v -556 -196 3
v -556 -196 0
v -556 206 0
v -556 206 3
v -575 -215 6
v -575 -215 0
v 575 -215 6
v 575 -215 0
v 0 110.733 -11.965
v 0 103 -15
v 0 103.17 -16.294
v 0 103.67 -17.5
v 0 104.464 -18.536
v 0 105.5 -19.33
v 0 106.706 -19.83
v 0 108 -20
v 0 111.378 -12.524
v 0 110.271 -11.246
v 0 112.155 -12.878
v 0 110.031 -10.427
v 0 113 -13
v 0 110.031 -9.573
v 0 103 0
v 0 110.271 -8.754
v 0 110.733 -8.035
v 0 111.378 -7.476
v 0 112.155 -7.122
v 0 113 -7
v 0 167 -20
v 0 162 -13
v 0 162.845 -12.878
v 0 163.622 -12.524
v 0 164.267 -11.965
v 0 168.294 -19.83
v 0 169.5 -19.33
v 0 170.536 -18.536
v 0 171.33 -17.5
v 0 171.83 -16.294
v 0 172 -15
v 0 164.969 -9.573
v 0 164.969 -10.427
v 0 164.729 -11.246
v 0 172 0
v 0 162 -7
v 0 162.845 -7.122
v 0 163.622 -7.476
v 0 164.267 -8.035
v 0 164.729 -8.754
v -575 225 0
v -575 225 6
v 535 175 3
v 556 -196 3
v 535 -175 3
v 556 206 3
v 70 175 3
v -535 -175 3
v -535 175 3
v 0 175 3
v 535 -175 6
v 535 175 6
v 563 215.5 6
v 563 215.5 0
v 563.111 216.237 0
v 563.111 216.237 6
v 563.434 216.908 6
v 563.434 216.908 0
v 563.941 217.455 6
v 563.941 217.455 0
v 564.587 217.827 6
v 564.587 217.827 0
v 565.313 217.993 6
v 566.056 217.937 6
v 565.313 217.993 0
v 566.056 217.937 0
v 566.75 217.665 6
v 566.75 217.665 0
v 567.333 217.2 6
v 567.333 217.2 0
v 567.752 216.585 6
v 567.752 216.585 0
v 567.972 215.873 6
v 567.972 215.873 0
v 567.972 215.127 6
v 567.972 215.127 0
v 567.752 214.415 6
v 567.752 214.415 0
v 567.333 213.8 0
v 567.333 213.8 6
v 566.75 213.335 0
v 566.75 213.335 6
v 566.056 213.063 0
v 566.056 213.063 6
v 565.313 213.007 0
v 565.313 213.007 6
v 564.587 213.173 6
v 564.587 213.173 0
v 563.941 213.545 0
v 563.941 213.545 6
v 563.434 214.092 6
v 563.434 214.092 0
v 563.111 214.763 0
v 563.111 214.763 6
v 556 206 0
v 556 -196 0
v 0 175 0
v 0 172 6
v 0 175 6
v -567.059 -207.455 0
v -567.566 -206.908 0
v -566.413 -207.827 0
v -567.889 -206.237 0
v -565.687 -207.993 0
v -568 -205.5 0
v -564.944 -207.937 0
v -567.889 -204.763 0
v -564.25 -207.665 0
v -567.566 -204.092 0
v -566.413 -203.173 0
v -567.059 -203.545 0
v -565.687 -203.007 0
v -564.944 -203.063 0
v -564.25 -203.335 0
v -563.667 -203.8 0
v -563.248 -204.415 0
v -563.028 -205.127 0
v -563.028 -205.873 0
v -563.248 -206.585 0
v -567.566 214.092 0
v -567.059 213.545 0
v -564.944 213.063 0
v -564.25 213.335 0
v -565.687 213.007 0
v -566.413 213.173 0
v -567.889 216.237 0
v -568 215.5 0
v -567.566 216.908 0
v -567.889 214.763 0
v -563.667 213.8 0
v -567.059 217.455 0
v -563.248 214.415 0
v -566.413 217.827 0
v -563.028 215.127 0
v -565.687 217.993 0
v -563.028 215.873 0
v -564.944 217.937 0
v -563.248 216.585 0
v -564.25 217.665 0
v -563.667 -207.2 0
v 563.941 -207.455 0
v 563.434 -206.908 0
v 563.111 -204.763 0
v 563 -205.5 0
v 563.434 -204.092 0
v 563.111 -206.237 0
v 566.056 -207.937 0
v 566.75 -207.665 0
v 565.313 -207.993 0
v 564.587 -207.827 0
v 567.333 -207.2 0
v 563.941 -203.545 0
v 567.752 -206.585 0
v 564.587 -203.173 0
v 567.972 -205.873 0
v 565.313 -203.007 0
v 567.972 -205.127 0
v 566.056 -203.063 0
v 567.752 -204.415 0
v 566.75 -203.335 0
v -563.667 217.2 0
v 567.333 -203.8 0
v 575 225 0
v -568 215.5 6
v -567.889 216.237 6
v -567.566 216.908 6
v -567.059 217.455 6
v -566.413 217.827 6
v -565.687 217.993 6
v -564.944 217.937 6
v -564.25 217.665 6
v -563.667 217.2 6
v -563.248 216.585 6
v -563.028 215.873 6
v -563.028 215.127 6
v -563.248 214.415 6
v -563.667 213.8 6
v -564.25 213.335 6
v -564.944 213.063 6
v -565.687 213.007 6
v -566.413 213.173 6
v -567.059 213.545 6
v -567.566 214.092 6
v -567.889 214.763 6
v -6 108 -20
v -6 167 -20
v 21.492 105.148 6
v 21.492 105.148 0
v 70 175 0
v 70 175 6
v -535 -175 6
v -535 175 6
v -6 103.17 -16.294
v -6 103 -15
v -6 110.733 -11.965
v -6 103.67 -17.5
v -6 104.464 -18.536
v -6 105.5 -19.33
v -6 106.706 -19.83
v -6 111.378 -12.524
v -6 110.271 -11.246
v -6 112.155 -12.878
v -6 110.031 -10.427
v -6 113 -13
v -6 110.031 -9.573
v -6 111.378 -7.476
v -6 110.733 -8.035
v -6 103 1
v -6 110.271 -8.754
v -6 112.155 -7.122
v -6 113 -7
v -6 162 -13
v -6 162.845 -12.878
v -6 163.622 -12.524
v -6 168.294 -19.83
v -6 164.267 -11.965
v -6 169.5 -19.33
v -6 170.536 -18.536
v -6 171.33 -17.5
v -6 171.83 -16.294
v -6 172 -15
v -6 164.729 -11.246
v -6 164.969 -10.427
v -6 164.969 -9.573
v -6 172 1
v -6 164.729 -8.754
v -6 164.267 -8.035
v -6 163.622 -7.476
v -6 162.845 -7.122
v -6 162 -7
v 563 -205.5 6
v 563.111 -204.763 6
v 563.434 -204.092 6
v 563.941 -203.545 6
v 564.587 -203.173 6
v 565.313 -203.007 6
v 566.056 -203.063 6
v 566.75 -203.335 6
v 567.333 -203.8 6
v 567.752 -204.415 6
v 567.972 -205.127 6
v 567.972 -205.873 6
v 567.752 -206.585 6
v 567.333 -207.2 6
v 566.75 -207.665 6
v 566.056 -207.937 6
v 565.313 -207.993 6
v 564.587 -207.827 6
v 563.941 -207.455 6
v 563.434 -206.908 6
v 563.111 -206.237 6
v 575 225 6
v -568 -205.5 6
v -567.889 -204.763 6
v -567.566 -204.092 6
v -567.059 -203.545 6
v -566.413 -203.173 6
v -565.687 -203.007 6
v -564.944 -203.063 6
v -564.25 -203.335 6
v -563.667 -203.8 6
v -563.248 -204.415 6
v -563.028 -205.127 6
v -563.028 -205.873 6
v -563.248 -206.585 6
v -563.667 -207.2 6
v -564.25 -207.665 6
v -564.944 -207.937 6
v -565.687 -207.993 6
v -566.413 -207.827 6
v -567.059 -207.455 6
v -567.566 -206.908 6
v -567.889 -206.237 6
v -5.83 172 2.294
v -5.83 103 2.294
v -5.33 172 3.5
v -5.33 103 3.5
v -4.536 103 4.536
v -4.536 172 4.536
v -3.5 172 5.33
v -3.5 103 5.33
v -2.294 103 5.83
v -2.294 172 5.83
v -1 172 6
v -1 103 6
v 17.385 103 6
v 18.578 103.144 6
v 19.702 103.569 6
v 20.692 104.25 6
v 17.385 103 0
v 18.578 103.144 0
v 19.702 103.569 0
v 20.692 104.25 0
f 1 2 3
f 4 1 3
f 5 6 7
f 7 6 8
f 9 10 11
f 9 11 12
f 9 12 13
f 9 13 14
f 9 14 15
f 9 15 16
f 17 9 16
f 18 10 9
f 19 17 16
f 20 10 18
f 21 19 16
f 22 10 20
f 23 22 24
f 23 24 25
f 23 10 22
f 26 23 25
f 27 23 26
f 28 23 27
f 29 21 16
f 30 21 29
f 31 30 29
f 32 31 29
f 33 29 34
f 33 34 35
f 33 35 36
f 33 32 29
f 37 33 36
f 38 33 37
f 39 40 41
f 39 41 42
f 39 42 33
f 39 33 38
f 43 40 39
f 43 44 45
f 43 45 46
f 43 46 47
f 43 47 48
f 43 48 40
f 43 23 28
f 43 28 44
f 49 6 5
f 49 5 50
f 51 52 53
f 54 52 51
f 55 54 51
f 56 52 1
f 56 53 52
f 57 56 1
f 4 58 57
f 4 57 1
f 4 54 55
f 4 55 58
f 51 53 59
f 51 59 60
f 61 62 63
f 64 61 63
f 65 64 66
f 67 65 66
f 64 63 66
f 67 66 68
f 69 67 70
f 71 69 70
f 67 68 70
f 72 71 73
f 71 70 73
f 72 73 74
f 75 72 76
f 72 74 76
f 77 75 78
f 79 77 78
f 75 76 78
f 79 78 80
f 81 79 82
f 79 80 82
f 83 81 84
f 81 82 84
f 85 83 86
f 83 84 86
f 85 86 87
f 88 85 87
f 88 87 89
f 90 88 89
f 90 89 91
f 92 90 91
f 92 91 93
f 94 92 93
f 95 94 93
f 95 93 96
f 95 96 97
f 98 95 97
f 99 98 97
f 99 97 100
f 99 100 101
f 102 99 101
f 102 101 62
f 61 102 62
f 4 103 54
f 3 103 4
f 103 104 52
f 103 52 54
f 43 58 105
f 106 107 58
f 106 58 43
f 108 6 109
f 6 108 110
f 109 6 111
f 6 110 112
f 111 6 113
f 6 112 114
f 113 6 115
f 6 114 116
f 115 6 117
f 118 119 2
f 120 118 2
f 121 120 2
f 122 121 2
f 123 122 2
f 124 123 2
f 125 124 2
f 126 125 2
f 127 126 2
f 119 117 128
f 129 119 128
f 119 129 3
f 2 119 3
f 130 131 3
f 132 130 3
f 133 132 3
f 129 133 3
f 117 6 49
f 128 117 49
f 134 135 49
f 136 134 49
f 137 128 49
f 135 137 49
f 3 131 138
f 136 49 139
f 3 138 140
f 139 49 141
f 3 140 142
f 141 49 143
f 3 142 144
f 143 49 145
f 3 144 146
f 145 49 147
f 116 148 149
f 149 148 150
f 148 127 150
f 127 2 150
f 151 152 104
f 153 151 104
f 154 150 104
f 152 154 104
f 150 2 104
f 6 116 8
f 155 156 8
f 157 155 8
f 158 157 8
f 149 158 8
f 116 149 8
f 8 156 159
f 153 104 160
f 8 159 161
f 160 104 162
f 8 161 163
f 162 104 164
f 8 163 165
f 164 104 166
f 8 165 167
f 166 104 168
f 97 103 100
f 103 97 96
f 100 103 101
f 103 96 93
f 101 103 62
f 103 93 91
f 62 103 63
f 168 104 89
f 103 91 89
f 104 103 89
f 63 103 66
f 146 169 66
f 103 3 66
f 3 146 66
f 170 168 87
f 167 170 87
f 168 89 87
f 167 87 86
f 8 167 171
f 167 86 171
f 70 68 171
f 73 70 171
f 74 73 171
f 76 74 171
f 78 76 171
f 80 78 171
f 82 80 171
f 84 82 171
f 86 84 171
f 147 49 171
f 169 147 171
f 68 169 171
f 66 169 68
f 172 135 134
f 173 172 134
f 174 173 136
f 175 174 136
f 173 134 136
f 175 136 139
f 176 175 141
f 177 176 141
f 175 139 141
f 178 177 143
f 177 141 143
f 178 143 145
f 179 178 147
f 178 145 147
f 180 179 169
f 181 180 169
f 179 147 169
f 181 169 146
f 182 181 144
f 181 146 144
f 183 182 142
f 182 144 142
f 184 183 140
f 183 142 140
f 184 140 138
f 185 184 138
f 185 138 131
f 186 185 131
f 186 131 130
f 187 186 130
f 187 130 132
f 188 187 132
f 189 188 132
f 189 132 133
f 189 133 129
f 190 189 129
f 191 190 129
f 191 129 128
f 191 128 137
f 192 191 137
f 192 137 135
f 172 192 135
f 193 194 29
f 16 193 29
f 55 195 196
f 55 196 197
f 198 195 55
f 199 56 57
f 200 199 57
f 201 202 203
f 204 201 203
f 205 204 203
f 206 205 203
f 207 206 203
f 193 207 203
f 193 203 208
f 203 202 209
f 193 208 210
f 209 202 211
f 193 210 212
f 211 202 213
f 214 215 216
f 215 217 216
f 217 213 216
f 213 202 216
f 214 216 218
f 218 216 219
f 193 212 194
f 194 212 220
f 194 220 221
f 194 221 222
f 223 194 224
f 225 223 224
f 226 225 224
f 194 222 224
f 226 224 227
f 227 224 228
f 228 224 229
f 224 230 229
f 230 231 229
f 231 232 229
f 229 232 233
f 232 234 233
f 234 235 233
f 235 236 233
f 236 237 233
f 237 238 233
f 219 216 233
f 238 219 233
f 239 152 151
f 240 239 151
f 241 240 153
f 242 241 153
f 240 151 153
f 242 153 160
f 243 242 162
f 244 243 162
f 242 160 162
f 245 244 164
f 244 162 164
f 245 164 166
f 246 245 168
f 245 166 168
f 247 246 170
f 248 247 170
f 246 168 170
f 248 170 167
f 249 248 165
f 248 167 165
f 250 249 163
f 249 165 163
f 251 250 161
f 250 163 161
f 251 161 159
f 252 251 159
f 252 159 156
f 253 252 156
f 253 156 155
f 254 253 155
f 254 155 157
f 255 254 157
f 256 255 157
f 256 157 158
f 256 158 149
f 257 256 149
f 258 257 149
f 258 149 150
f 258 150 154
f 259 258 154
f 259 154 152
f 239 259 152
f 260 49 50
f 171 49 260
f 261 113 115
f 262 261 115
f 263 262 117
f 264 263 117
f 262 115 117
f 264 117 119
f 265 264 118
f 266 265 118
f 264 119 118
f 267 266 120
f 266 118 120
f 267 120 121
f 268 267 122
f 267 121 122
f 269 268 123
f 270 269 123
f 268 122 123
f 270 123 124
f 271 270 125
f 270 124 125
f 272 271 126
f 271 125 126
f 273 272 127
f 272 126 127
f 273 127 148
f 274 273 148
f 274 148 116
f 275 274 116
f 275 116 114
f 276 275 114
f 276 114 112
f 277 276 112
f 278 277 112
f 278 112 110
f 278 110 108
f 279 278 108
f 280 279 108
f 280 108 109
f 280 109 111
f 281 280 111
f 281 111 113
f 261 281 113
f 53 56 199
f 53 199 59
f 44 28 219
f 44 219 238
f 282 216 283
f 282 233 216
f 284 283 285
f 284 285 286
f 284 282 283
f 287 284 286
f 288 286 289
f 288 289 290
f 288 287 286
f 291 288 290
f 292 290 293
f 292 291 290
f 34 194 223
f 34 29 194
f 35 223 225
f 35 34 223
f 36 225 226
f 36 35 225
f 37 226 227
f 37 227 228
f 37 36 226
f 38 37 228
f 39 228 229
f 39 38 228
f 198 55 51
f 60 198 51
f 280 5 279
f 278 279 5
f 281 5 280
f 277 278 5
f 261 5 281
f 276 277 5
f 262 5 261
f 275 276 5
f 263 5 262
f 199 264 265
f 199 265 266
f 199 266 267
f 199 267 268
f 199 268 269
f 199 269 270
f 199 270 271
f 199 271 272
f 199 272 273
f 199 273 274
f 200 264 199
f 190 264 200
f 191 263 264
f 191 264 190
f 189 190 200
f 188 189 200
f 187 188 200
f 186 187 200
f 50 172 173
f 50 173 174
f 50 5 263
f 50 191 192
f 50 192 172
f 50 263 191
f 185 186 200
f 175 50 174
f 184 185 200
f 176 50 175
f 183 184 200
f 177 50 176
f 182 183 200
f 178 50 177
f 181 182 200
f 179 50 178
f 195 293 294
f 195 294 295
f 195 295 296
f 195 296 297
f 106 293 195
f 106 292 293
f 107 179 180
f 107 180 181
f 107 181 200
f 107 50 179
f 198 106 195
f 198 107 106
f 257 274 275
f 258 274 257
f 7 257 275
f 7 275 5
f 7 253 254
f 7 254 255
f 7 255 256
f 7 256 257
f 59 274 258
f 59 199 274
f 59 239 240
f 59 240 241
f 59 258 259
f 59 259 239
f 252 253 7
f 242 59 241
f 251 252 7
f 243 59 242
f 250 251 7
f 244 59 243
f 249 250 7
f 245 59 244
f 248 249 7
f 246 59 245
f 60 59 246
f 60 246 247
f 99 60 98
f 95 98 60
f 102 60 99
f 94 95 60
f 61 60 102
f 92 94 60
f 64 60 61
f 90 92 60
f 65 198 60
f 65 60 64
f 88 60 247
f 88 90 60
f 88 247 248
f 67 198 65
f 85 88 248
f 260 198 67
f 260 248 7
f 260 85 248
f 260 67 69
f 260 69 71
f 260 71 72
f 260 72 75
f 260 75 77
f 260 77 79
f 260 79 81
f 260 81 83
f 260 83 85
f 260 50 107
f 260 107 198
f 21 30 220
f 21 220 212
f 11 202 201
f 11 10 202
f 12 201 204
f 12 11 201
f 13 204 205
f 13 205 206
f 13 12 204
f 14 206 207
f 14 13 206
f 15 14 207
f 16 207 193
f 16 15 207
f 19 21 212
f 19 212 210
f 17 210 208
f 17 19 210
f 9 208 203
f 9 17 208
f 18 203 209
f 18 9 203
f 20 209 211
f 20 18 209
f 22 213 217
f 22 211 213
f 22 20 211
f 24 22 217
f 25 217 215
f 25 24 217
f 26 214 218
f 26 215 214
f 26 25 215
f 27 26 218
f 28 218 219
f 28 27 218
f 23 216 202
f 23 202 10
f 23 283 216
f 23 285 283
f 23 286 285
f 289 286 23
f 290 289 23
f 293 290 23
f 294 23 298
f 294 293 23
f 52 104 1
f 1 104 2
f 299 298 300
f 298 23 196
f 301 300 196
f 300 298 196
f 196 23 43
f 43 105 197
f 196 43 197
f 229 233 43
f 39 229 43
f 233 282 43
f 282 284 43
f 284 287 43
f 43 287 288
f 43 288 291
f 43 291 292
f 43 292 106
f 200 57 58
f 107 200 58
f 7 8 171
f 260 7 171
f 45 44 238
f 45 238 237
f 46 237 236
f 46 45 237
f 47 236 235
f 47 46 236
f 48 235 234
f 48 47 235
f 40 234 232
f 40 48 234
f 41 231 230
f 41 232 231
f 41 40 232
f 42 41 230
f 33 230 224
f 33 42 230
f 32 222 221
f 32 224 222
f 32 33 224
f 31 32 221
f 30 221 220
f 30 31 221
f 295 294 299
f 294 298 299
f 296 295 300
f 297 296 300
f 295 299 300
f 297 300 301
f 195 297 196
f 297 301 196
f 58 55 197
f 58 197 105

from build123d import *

# Parameters (mm, degrees)
SKETCH1_W           = 1150
SKETCH1_H           = 440
SKETCH1_W_2         = 1070
SKETCH1_H_2         = 350
BOSS_EXTRUDE1_DEPTH = 6
SKETCH3_R           = 2.5
CUT_EXTRUDE2_DEPTH  = 618.483603021
SKETCH2_W           = 1112
SKETCH2_H           = 402
SKETCH2_W_2         = 1070
SKETCH2_H_2         = 350
CUT_EXTRUDE1_DEPTH  = 3
BOSS_EXTRUDE2_DEPTH = 6
SKETCH5_W           = 6
SKETCH5_H           = 69
BOSS_EXTRUDE3_DEPTH = 26
CUT_EXTRUDE3_DEPTH  = 26
FILLET1_R           = 5


with BuildPart() as part:
    # Sketch1 → Boss-Extrude1 (new body)
    with BuildSketch(Plane.XY):
        with Locations((0, 5)):
            Rectangle(SKETCH1_W, SKETCH1_H)
        Rectangle(SKETCH1_W_2, SKETCH1_H_2, mode=Mode.SUBTRACT)
    extrude(amount=BOSS_EXTRUDE1_DEPTH)

    # Sketch3 → Cut-Extrude2 (cut, through all)
    with BuildSketch(Plane(origin=(0, 0, 0), x_dir=(-1, 0, 0), z_dir=(0, 0, -1))):
        with Locations((-565.5, 215.5)):
            Circle(SKETCH3_R)
        with Locations((565.5, 215.5)):
            Circle(SKETCH3_R)
        with Locations((565.5, -205.5)):
            Circle(SKETCH3_R)
        with Locations((-565.5, -205.5)):
            Circle(SKETCH3_R)
    extrude(amount=-CUT_EXTRUDE2_DEPTH, mode=Mode.SUBTRACT)

    # Sketch2 → Cut-Extrude1 (cut)
    with BuildSketch(Plane(origin=(0, 0, 0), x_dir=(-1, 0, 0), z_dir=(0, 0, -1))):
        with Locations((0, 5)):
            Rectangle(SKETCH2_W, SKETCH2_H)
        Rectangle(SKETCH2_W_2, SKETCH2_H_2, mode=Mode.SUBTRACT)
    extrude(amount=-CUT_EXTRUDE1_DEPTH, mode=Mode.SUBTRACT)

    # Sketch4 → Boss-Extrude2 (add)
    with BuildSketch(Plane.XY.offset(6)):
        Polygon((0, 175), (0, 103), (20, 103), (70, 175), align=None)
    extrude(amount=-BOSS_EXTRUDE2_DEPTH)

    # Sketch5 → Boss-Extrude3 (add)
    with BuildSketch(Plane.XY.offset(6)):
        with Locations((-3, 137.5)):
            Rectangle(SKETCH5_W, SKETCH5_H)
    extrude(amount=-BOSS_EXTRUDE3_DEPTH)

    # Sketch6 → Cut-Extrude3 (cut)
    with BuildSketch(Plane(origin=(0, 0, 0), x_dir=(0, 0, -1), z_dir=(1, 0, 0))):
        with BuildLine():
            Line((13, 162), (13, 113))
            ThreePointArc((13, 113), (10, 110), (7, 113))
            Line((7, 113), (7, 162))
            ThreePointArc((7, 162), (10, 165), (13, 162))
        make_face()
    extrude(amount=-CUT_EXTRUDE3_DEPTH, mode=Mode.SUBTRACT)

    # Fillet1
    fillet1_edges = [part.edges().sort_by_distance(p)[0] for p in [
        (20, 103, 3),
        (-3, 103, -20),
        (-3, 172, -20),
        (-6, 137.5, 6),
    ]]
    fillet(fillet1_edges, radius=FILLET1_R)


solid = part.part
